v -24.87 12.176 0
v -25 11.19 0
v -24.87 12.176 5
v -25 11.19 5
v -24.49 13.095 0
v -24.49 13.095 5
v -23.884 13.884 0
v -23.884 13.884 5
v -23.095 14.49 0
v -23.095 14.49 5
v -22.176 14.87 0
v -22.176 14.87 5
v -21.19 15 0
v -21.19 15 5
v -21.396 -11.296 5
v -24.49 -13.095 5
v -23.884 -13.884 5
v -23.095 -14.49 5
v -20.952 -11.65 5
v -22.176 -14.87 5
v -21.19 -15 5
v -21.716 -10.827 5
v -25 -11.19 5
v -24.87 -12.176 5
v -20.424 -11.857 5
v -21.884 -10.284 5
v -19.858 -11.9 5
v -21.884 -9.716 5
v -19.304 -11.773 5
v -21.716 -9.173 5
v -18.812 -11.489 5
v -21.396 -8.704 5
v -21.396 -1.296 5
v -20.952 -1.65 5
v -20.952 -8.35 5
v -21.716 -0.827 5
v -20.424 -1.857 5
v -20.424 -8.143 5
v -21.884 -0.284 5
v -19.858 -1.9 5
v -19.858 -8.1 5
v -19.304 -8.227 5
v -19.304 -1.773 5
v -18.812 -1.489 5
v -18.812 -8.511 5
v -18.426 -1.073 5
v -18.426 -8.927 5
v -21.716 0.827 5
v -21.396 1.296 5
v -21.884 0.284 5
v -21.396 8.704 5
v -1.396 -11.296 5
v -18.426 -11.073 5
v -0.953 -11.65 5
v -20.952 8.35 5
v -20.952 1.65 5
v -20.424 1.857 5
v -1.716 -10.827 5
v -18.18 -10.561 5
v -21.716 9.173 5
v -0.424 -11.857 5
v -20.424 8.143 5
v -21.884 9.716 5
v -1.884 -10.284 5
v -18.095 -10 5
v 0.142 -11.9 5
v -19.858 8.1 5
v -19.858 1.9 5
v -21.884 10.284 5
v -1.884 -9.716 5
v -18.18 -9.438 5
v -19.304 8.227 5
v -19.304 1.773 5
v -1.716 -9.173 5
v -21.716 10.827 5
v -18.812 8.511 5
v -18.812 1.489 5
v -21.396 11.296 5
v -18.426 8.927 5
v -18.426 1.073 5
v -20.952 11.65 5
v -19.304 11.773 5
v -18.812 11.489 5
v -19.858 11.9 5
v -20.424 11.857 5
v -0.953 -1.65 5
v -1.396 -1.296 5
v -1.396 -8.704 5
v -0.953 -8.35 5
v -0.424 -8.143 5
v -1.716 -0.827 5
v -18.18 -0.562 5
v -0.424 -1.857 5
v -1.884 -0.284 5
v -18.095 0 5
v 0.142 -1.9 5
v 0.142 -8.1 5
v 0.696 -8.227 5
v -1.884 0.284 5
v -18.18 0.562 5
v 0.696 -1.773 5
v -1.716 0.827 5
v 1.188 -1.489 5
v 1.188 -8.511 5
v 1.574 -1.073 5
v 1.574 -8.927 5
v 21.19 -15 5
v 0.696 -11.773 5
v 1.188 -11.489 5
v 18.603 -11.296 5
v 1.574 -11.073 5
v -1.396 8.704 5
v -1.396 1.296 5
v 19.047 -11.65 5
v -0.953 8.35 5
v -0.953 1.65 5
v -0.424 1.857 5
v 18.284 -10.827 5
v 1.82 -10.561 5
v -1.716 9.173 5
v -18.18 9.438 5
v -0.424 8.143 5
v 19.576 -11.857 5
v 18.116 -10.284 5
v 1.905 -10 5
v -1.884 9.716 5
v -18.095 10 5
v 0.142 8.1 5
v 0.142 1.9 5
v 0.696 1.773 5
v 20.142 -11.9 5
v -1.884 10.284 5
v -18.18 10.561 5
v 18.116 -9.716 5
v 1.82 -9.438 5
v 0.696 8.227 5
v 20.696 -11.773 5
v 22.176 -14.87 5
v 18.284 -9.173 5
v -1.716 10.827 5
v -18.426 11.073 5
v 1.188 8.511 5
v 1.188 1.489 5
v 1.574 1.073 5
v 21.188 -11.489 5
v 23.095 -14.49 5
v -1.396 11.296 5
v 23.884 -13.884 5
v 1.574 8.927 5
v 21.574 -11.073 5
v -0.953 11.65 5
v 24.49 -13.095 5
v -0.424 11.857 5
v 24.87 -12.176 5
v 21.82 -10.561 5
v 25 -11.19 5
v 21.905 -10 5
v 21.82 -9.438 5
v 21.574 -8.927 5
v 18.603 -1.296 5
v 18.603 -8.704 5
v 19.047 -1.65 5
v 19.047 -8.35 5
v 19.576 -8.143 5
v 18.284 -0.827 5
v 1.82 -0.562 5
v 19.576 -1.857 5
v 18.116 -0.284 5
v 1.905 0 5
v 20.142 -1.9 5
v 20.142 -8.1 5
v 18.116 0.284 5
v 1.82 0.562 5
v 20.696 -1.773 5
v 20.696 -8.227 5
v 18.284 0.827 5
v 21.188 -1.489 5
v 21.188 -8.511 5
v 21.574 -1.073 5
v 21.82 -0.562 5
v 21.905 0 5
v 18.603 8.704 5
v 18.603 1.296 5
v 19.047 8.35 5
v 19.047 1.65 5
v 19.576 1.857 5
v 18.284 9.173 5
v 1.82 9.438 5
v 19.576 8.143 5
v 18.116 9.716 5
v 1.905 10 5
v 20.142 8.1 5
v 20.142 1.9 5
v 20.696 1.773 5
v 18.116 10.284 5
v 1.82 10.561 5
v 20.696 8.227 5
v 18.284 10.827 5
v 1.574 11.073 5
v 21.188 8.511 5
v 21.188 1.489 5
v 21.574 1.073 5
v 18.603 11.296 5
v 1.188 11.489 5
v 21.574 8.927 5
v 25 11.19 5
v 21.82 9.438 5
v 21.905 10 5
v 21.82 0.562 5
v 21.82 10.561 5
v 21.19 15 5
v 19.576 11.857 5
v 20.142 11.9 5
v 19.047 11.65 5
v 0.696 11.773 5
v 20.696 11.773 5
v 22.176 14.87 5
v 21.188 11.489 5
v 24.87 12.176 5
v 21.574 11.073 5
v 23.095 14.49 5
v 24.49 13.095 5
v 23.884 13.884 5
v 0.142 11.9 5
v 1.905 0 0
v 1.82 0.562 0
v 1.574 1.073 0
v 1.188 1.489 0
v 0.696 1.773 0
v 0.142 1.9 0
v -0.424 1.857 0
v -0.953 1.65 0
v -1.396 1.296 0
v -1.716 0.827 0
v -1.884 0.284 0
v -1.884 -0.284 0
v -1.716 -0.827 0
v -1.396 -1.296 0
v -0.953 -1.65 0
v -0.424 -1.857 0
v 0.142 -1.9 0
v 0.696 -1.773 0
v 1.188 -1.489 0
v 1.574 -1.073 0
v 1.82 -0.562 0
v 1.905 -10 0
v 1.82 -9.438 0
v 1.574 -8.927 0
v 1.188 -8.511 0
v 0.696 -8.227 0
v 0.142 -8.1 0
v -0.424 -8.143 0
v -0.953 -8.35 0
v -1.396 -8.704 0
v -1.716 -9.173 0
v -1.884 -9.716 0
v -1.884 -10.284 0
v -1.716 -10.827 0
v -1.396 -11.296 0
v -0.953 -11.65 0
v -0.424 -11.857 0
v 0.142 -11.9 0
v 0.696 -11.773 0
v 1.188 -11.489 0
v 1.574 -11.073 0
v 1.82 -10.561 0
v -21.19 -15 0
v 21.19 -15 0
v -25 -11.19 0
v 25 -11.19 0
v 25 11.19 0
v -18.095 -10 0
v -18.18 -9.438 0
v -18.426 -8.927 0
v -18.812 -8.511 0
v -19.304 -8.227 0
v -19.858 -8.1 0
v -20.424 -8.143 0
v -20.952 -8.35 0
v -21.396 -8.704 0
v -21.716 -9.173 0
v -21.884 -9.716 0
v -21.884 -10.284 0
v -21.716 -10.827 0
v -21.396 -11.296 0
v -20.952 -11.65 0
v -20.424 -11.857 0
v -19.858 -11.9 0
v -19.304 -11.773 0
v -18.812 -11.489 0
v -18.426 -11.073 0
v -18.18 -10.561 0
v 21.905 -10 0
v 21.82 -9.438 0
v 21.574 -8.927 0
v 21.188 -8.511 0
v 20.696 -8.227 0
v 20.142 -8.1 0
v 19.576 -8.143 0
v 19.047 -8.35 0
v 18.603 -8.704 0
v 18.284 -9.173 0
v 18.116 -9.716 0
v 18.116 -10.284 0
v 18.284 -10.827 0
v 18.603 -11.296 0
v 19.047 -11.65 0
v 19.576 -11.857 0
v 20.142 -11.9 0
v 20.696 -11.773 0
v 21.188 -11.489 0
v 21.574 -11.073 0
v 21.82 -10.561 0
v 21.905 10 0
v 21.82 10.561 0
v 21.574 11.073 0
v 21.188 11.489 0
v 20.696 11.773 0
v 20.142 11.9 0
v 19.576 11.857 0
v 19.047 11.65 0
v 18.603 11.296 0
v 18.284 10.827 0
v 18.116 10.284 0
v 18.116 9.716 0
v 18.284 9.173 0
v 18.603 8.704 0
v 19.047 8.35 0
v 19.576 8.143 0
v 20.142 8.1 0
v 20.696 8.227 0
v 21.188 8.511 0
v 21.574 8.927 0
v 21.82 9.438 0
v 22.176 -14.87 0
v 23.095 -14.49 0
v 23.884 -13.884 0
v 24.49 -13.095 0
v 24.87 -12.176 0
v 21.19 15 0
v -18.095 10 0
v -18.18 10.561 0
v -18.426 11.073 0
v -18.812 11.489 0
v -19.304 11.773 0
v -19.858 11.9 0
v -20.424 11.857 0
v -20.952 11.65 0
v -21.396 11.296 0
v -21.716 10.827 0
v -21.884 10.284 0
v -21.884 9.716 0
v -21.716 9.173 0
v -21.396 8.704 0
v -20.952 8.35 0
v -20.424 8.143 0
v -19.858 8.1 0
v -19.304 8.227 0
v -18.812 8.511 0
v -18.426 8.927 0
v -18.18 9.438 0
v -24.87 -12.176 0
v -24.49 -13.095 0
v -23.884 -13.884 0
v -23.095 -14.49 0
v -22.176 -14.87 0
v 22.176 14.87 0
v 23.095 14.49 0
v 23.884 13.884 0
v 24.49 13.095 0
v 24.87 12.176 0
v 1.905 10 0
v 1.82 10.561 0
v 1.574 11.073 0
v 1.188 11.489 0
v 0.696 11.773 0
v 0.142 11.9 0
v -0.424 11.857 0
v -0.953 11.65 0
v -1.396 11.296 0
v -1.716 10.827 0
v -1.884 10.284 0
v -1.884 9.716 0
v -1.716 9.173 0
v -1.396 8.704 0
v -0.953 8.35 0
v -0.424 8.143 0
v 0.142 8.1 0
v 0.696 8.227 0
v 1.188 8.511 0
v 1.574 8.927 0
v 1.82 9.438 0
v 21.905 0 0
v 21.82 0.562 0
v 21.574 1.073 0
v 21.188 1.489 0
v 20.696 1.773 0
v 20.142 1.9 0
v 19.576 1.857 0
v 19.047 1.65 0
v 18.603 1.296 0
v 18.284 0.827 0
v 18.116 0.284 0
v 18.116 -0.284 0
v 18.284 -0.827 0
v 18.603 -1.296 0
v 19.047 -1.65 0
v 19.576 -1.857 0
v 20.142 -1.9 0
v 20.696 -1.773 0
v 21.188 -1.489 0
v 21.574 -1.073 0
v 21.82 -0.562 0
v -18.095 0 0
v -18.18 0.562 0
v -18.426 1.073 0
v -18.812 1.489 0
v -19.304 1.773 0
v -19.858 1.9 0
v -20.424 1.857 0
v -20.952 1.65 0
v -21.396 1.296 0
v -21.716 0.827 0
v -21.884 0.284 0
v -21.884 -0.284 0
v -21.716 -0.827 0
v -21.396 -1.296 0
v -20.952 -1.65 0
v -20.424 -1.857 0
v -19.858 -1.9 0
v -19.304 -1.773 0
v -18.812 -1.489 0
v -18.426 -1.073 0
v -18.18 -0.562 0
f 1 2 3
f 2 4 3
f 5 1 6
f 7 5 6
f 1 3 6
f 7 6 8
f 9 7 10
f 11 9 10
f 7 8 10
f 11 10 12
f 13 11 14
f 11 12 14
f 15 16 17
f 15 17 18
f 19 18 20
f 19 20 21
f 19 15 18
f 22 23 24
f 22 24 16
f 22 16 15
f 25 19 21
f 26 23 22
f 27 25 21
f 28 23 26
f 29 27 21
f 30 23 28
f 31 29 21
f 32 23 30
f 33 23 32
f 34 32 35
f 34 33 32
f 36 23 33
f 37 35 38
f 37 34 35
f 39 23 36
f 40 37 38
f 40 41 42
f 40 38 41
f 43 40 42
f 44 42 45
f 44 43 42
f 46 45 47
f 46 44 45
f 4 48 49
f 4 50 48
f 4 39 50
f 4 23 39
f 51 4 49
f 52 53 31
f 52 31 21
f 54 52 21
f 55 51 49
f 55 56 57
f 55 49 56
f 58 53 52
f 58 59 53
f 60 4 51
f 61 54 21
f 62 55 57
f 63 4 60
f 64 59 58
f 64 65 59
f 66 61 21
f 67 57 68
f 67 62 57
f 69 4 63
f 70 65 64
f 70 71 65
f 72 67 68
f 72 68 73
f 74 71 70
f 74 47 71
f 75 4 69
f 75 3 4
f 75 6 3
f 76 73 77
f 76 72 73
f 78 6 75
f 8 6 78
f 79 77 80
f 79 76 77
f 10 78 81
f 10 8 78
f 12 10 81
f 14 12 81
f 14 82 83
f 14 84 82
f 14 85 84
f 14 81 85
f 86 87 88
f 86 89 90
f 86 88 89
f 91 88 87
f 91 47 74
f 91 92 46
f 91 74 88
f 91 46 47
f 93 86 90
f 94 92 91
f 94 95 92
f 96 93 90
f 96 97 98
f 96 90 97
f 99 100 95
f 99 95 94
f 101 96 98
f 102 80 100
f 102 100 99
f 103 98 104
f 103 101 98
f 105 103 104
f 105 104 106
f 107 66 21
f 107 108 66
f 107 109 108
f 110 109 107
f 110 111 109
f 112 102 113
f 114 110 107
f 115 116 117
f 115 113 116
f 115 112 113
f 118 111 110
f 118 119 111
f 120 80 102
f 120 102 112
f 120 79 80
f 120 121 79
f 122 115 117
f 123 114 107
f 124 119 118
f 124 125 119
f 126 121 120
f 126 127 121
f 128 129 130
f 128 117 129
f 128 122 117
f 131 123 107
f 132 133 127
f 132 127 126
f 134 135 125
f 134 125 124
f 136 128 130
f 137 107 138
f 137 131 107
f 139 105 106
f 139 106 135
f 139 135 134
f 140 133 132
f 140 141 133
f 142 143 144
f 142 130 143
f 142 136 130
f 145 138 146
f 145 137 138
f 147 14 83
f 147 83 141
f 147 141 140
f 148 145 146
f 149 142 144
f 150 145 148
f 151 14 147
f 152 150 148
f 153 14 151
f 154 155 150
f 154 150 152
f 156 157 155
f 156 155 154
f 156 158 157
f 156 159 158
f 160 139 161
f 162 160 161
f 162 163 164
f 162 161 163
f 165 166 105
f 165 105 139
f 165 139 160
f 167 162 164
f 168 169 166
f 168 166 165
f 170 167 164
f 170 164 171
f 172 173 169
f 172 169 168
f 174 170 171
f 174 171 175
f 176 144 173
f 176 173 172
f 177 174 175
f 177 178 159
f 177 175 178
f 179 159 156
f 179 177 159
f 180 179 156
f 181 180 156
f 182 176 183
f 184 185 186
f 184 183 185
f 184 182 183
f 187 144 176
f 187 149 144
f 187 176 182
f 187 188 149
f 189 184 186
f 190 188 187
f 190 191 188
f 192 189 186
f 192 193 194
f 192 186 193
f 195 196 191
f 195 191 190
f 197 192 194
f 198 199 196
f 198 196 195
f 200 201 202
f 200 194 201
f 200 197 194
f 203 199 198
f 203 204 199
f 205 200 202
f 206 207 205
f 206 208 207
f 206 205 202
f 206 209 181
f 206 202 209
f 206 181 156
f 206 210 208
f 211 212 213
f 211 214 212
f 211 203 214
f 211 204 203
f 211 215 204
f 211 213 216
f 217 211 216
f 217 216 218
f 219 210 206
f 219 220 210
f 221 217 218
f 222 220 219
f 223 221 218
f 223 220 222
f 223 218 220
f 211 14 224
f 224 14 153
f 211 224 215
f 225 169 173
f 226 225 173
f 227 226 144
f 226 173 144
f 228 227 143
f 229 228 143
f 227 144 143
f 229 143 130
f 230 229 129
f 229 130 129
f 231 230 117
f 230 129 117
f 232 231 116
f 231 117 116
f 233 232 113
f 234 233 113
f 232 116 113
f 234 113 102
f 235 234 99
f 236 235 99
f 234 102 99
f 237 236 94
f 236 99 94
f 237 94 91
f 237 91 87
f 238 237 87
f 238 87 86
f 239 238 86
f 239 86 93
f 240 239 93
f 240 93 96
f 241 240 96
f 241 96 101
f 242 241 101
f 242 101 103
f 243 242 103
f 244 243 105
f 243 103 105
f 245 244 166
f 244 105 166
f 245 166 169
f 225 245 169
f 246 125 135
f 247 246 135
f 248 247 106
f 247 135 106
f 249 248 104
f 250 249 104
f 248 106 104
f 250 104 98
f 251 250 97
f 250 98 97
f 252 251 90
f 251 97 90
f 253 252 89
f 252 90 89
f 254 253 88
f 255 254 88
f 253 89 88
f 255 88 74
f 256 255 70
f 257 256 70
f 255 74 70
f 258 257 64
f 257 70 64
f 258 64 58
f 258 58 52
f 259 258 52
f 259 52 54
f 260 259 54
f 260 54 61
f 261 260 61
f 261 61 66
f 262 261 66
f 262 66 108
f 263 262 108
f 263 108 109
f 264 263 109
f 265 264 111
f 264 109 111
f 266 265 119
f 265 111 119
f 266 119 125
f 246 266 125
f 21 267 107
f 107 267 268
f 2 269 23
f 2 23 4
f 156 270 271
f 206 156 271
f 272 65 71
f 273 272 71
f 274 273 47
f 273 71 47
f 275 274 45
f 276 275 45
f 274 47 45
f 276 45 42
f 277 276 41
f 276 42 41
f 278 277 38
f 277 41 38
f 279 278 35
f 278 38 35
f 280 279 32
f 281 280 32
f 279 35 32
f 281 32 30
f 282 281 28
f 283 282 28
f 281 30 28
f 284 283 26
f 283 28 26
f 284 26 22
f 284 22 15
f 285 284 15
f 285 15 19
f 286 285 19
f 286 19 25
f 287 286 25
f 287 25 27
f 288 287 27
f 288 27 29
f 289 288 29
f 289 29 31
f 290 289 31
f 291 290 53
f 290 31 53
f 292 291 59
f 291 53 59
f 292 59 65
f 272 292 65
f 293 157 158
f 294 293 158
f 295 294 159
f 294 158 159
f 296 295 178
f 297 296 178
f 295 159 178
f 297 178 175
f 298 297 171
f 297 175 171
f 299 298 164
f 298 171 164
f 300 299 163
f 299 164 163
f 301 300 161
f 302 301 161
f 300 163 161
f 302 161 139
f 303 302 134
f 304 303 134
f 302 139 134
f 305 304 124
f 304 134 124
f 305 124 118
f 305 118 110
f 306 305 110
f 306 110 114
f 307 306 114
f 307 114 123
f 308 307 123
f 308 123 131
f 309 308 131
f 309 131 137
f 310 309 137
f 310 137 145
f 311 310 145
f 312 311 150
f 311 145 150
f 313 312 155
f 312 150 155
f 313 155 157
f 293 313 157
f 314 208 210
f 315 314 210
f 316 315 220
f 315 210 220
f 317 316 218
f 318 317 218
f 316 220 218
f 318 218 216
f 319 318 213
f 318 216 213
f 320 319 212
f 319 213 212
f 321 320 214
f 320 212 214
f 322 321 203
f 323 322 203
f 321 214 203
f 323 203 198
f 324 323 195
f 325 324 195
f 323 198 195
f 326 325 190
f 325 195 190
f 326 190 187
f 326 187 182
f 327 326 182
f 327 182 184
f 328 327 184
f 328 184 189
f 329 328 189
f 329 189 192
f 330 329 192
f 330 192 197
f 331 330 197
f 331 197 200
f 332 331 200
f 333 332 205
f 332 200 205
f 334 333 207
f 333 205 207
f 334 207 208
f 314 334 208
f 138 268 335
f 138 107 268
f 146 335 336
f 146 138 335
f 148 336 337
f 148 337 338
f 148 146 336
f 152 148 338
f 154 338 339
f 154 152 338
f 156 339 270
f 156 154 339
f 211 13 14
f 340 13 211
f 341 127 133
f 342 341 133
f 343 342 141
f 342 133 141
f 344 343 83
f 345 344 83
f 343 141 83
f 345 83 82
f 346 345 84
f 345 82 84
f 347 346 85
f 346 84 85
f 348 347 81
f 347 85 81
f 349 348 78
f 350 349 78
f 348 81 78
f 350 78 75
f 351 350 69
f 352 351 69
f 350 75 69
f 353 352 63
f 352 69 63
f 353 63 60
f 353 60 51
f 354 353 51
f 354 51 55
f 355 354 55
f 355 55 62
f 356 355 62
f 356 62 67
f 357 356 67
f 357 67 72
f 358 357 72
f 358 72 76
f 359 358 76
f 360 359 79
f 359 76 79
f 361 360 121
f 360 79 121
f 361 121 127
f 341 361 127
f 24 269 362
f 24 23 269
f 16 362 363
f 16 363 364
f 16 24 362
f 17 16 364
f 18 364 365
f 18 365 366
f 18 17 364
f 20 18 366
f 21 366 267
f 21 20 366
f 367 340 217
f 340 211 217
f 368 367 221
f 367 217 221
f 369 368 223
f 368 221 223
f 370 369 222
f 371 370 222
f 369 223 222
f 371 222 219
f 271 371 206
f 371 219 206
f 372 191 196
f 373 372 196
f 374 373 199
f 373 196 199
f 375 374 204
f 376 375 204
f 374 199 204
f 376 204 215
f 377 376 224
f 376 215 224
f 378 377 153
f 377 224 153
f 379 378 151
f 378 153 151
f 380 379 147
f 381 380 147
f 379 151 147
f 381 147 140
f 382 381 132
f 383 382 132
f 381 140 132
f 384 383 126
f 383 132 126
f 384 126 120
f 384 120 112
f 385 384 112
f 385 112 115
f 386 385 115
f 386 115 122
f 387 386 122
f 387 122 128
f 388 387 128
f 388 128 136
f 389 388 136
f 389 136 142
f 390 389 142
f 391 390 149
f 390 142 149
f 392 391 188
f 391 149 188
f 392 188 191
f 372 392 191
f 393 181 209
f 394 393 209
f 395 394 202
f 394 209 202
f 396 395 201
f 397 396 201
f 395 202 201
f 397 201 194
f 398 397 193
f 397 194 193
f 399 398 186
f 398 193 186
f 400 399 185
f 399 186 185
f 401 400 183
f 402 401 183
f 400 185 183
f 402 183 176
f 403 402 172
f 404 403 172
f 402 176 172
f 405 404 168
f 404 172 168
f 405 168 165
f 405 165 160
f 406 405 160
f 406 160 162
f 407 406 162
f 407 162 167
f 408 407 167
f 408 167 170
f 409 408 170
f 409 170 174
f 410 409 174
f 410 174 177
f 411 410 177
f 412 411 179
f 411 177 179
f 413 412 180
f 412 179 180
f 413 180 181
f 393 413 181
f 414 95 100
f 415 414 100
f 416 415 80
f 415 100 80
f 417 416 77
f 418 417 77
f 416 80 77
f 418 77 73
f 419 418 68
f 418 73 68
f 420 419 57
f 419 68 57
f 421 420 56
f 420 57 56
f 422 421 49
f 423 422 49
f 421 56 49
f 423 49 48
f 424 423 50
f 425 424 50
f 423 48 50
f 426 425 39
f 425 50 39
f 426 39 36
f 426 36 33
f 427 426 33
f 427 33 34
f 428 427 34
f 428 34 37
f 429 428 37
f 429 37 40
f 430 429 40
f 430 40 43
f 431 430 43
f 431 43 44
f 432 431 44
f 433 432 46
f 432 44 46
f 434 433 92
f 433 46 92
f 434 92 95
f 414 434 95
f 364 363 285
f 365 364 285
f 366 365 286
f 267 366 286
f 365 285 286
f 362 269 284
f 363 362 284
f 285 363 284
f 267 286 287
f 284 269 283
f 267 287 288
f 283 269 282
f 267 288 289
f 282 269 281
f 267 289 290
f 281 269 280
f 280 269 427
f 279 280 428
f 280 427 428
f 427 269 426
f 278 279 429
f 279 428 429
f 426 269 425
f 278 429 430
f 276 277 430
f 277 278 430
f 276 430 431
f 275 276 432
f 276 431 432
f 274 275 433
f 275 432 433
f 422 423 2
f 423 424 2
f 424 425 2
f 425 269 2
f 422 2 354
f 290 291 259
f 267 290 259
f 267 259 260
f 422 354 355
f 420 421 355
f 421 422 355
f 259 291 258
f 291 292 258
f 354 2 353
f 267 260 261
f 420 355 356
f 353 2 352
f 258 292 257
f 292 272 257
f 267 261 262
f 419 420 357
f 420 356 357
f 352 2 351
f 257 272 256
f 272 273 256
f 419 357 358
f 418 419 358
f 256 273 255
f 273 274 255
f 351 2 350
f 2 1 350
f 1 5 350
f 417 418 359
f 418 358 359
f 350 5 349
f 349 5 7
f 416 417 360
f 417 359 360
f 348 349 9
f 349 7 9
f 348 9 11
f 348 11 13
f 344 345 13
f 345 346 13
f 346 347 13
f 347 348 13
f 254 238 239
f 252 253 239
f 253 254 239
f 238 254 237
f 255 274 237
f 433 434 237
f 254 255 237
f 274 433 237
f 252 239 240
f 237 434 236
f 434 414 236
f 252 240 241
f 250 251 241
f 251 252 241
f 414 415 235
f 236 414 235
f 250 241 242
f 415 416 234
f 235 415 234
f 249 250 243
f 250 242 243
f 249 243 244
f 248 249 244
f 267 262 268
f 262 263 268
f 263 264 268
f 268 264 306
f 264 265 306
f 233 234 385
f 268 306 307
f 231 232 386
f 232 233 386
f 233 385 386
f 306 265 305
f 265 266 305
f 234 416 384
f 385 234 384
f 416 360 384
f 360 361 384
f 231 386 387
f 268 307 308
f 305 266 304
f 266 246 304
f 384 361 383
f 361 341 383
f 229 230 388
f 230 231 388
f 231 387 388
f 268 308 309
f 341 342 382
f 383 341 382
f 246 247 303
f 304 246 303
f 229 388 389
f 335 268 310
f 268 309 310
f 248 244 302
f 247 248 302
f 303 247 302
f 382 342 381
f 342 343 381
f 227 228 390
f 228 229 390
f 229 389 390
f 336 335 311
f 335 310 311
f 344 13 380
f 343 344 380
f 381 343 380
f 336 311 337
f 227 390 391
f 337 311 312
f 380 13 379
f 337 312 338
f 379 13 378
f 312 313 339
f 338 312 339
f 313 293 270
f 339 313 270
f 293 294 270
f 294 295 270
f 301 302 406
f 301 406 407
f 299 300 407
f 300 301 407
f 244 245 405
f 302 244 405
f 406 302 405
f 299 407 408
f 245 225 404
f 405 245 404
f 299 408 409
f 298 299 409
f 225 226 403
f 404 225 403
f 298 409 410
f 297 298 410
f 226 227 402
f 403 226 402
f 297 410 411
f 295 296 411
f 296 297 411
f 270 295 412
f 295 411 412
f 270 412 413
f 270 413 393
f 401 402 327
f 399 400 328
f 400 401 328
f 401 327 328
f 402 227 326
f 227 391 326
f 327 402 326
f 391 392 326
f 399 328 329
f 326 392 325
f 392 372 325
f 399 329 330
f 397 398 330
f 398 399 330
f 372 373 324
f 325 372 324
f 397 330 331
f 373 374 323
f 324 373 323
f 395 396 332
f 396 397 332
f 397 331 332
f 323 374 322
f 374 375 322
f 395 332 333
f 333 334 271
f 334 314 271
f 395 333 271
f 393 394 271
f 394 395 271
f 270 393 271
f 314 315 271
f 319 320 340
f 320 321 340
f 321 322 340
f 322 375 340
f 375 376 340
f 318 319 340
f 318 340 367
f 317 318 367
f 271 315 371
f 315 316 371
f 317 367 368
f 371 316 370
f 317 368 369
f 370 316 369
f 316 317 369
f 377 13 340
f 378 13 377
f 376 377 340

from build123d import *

# Parameters (mm, degrees)
SKETCH1_W                     = 49.9999
SKETCH1_H                     = 29.99994
BOSS_EXTRUDE1_DEPTH           = 4.99999
SKETCH2_R                     = 1.905
CUT_EXTRUDE1_DEPTH            = 4.99999
LPATTERN1_COUNT               = 2
LPATTERN1_PITCH               = 9.99998
LPATTERN1_COL_COUNT           = 2
LPATTERN1_COL_PITCH           = 9.99998
LPATTERN2_COUNT               = 2
LPATTERN2_PITCH               = 19.99996
LPATTERN2_COPY_1_SKETCH_R     = 1.905
LPATTERN2_COPY_1_DEPTH        = 4.99999
LPATTERN2_COPY_2_SKETCH_R     = 1.905
LPATTERN2_COPY_2_DEPTH        = 4.99999
LPATTERN2_COL_COUNT           = 2
LPATTERN2_COL_PITCH           = 19.99996
LPATTERN2_COL_COPY_1_SKETCH_R = 1.905
LPATTERN2_COL_COPY_1_DEPTH    = 4.99999
LPATTERN2_COL_COPY_2_SKETCH_R = 1.905
LPATTERN2_COL_COPY_2_DEPTH    = 4.99999
FILLET1_R                     = 3.81


with BuildPart() as part:
    # Sketch1 → Boss-Extrude1 (new body)
    with BuildSketch(Plane.XY):
        Rectangle(SKETCH1_W, SKETCH1_H)
    extrude(amount=BOSS_EXTRUDE1_DEPTH)

    # Sketch2 → Cut-Extrude1 (cut)
    with BuildSketch(Plane.XY.offset(4.99999)):
        Circle(SKETCH2_R)
    cut_extrude1 = extrude(amount=-CUT_EXTRUDE1_DEPTH, mode=Mode.SUBTRACT)

    # LPattern1: Cut-Extrude1 ×2
    with Locations(*[(0, i * LPATTERN1_PITCH, 0) for i in range(1, LPATTERN1_COUNT)]):
        add(cut_extrude1, mode=Mode.SUBTRACT)

    # LPattern1 col: Cut-Extrude1 ×2
    with Locations(*[(0, -i * LPATTERN1_COL_PITCH, 0) for i in range(1, LPATTERN1_COL_COUNT)]):
        add(cut_extrude1, mode=Mode.SUBTRACT)

    # LPattern2: Cut-Extrude1 ×2
    with Locations(*[(-i * LPATTERN2_PITCH, 0, 0) for i in range(1, LPATTERN2_COUNT)]):
        add(cut_extrude1, mode=Mode.SUBTRACT)

    # LPattern2 copy 1 sketch → LPattern2 copy 1 (cut)
    with BuildSketch(Plane(origin=(-19.99996, 9.99998, 4.99999), x_dir=(1, 0, 0), z_dir=(0, 0, 1))):
        Circle(LPATTERN2_COPY_1_SKETCH_R)
    extrude(amount=-LPATTERN2_COPY_1_DEPTH, mode=Mode.SUBTRACT)

    # LPattern2 copy 2 sketch → LPattern2 copy 2 (cut)
    with BuildSketch(Plane(origin=(-19.99996, -9.99998, 4.99999), x_dir=(1, 0, 0), z_dir=(0, 0, 1))):
        Circle(LPATTERN2_COPY_2_SKETCH_R)
    extrude(amount=-LPATTERN2_COPY_2_DEPTH, mode=Mode.SUBTRACT)

    # LPattern2 col: Cut-Extrude1 ×2
    with Locations(*[(i * LPATTERN2_COL_PITCH, 0, 0) for i in range(1, LPATTERN2_COL_COUNT)]):
        add(cut_extrude1, mode=Mode.SUBTRACT)

    # LPattern2 col copy 1 sketch → LPattern2 col copy 1 (cut)
    with BuildSketch(Plane(origin=(19.99996, 9.99998, 4.99999), x_dir=(1, 0, 0), z_dir=(0, 0, 1))):
        Circle(LPATTERN2_COL_COPY_1_SKETCH_R)
    extrude(amount=-LPATTERN2_COL_COPY_1_DEPTH, mode=Mode.SUBTRACT)

    # LPattern2 col copy 2 sketch → LPattern2 col copy 2 (cut)
    with BuildSketch(Plane(origin=(19.99996, -9.99998, 4.99999), x_dir=(1, 0, 0), z_dir=(0, 0, 1))):
        Circle(LPATTERN2_COL_COPY_2_SKETCH_R)
    extrude(amount=-LPATTERN2_COL_COPY_2_DEPTH, mode=Mode.SUBTRACT)

    # Fillet1
    fillet1_edges = [part.edges().sort_by_distance(p)[0] for p in [
        (24.99995, -14.99997, 2.499995),
        (-24.99995, -14.99997, 2.499995),
        (-24.99995, 14.99997, 2.499995),
        (24.99995, 14.99997, 2.499995),
    ]]
    fillet(fillet1_edges, radius=FILLET1_R)


solid = part.part
